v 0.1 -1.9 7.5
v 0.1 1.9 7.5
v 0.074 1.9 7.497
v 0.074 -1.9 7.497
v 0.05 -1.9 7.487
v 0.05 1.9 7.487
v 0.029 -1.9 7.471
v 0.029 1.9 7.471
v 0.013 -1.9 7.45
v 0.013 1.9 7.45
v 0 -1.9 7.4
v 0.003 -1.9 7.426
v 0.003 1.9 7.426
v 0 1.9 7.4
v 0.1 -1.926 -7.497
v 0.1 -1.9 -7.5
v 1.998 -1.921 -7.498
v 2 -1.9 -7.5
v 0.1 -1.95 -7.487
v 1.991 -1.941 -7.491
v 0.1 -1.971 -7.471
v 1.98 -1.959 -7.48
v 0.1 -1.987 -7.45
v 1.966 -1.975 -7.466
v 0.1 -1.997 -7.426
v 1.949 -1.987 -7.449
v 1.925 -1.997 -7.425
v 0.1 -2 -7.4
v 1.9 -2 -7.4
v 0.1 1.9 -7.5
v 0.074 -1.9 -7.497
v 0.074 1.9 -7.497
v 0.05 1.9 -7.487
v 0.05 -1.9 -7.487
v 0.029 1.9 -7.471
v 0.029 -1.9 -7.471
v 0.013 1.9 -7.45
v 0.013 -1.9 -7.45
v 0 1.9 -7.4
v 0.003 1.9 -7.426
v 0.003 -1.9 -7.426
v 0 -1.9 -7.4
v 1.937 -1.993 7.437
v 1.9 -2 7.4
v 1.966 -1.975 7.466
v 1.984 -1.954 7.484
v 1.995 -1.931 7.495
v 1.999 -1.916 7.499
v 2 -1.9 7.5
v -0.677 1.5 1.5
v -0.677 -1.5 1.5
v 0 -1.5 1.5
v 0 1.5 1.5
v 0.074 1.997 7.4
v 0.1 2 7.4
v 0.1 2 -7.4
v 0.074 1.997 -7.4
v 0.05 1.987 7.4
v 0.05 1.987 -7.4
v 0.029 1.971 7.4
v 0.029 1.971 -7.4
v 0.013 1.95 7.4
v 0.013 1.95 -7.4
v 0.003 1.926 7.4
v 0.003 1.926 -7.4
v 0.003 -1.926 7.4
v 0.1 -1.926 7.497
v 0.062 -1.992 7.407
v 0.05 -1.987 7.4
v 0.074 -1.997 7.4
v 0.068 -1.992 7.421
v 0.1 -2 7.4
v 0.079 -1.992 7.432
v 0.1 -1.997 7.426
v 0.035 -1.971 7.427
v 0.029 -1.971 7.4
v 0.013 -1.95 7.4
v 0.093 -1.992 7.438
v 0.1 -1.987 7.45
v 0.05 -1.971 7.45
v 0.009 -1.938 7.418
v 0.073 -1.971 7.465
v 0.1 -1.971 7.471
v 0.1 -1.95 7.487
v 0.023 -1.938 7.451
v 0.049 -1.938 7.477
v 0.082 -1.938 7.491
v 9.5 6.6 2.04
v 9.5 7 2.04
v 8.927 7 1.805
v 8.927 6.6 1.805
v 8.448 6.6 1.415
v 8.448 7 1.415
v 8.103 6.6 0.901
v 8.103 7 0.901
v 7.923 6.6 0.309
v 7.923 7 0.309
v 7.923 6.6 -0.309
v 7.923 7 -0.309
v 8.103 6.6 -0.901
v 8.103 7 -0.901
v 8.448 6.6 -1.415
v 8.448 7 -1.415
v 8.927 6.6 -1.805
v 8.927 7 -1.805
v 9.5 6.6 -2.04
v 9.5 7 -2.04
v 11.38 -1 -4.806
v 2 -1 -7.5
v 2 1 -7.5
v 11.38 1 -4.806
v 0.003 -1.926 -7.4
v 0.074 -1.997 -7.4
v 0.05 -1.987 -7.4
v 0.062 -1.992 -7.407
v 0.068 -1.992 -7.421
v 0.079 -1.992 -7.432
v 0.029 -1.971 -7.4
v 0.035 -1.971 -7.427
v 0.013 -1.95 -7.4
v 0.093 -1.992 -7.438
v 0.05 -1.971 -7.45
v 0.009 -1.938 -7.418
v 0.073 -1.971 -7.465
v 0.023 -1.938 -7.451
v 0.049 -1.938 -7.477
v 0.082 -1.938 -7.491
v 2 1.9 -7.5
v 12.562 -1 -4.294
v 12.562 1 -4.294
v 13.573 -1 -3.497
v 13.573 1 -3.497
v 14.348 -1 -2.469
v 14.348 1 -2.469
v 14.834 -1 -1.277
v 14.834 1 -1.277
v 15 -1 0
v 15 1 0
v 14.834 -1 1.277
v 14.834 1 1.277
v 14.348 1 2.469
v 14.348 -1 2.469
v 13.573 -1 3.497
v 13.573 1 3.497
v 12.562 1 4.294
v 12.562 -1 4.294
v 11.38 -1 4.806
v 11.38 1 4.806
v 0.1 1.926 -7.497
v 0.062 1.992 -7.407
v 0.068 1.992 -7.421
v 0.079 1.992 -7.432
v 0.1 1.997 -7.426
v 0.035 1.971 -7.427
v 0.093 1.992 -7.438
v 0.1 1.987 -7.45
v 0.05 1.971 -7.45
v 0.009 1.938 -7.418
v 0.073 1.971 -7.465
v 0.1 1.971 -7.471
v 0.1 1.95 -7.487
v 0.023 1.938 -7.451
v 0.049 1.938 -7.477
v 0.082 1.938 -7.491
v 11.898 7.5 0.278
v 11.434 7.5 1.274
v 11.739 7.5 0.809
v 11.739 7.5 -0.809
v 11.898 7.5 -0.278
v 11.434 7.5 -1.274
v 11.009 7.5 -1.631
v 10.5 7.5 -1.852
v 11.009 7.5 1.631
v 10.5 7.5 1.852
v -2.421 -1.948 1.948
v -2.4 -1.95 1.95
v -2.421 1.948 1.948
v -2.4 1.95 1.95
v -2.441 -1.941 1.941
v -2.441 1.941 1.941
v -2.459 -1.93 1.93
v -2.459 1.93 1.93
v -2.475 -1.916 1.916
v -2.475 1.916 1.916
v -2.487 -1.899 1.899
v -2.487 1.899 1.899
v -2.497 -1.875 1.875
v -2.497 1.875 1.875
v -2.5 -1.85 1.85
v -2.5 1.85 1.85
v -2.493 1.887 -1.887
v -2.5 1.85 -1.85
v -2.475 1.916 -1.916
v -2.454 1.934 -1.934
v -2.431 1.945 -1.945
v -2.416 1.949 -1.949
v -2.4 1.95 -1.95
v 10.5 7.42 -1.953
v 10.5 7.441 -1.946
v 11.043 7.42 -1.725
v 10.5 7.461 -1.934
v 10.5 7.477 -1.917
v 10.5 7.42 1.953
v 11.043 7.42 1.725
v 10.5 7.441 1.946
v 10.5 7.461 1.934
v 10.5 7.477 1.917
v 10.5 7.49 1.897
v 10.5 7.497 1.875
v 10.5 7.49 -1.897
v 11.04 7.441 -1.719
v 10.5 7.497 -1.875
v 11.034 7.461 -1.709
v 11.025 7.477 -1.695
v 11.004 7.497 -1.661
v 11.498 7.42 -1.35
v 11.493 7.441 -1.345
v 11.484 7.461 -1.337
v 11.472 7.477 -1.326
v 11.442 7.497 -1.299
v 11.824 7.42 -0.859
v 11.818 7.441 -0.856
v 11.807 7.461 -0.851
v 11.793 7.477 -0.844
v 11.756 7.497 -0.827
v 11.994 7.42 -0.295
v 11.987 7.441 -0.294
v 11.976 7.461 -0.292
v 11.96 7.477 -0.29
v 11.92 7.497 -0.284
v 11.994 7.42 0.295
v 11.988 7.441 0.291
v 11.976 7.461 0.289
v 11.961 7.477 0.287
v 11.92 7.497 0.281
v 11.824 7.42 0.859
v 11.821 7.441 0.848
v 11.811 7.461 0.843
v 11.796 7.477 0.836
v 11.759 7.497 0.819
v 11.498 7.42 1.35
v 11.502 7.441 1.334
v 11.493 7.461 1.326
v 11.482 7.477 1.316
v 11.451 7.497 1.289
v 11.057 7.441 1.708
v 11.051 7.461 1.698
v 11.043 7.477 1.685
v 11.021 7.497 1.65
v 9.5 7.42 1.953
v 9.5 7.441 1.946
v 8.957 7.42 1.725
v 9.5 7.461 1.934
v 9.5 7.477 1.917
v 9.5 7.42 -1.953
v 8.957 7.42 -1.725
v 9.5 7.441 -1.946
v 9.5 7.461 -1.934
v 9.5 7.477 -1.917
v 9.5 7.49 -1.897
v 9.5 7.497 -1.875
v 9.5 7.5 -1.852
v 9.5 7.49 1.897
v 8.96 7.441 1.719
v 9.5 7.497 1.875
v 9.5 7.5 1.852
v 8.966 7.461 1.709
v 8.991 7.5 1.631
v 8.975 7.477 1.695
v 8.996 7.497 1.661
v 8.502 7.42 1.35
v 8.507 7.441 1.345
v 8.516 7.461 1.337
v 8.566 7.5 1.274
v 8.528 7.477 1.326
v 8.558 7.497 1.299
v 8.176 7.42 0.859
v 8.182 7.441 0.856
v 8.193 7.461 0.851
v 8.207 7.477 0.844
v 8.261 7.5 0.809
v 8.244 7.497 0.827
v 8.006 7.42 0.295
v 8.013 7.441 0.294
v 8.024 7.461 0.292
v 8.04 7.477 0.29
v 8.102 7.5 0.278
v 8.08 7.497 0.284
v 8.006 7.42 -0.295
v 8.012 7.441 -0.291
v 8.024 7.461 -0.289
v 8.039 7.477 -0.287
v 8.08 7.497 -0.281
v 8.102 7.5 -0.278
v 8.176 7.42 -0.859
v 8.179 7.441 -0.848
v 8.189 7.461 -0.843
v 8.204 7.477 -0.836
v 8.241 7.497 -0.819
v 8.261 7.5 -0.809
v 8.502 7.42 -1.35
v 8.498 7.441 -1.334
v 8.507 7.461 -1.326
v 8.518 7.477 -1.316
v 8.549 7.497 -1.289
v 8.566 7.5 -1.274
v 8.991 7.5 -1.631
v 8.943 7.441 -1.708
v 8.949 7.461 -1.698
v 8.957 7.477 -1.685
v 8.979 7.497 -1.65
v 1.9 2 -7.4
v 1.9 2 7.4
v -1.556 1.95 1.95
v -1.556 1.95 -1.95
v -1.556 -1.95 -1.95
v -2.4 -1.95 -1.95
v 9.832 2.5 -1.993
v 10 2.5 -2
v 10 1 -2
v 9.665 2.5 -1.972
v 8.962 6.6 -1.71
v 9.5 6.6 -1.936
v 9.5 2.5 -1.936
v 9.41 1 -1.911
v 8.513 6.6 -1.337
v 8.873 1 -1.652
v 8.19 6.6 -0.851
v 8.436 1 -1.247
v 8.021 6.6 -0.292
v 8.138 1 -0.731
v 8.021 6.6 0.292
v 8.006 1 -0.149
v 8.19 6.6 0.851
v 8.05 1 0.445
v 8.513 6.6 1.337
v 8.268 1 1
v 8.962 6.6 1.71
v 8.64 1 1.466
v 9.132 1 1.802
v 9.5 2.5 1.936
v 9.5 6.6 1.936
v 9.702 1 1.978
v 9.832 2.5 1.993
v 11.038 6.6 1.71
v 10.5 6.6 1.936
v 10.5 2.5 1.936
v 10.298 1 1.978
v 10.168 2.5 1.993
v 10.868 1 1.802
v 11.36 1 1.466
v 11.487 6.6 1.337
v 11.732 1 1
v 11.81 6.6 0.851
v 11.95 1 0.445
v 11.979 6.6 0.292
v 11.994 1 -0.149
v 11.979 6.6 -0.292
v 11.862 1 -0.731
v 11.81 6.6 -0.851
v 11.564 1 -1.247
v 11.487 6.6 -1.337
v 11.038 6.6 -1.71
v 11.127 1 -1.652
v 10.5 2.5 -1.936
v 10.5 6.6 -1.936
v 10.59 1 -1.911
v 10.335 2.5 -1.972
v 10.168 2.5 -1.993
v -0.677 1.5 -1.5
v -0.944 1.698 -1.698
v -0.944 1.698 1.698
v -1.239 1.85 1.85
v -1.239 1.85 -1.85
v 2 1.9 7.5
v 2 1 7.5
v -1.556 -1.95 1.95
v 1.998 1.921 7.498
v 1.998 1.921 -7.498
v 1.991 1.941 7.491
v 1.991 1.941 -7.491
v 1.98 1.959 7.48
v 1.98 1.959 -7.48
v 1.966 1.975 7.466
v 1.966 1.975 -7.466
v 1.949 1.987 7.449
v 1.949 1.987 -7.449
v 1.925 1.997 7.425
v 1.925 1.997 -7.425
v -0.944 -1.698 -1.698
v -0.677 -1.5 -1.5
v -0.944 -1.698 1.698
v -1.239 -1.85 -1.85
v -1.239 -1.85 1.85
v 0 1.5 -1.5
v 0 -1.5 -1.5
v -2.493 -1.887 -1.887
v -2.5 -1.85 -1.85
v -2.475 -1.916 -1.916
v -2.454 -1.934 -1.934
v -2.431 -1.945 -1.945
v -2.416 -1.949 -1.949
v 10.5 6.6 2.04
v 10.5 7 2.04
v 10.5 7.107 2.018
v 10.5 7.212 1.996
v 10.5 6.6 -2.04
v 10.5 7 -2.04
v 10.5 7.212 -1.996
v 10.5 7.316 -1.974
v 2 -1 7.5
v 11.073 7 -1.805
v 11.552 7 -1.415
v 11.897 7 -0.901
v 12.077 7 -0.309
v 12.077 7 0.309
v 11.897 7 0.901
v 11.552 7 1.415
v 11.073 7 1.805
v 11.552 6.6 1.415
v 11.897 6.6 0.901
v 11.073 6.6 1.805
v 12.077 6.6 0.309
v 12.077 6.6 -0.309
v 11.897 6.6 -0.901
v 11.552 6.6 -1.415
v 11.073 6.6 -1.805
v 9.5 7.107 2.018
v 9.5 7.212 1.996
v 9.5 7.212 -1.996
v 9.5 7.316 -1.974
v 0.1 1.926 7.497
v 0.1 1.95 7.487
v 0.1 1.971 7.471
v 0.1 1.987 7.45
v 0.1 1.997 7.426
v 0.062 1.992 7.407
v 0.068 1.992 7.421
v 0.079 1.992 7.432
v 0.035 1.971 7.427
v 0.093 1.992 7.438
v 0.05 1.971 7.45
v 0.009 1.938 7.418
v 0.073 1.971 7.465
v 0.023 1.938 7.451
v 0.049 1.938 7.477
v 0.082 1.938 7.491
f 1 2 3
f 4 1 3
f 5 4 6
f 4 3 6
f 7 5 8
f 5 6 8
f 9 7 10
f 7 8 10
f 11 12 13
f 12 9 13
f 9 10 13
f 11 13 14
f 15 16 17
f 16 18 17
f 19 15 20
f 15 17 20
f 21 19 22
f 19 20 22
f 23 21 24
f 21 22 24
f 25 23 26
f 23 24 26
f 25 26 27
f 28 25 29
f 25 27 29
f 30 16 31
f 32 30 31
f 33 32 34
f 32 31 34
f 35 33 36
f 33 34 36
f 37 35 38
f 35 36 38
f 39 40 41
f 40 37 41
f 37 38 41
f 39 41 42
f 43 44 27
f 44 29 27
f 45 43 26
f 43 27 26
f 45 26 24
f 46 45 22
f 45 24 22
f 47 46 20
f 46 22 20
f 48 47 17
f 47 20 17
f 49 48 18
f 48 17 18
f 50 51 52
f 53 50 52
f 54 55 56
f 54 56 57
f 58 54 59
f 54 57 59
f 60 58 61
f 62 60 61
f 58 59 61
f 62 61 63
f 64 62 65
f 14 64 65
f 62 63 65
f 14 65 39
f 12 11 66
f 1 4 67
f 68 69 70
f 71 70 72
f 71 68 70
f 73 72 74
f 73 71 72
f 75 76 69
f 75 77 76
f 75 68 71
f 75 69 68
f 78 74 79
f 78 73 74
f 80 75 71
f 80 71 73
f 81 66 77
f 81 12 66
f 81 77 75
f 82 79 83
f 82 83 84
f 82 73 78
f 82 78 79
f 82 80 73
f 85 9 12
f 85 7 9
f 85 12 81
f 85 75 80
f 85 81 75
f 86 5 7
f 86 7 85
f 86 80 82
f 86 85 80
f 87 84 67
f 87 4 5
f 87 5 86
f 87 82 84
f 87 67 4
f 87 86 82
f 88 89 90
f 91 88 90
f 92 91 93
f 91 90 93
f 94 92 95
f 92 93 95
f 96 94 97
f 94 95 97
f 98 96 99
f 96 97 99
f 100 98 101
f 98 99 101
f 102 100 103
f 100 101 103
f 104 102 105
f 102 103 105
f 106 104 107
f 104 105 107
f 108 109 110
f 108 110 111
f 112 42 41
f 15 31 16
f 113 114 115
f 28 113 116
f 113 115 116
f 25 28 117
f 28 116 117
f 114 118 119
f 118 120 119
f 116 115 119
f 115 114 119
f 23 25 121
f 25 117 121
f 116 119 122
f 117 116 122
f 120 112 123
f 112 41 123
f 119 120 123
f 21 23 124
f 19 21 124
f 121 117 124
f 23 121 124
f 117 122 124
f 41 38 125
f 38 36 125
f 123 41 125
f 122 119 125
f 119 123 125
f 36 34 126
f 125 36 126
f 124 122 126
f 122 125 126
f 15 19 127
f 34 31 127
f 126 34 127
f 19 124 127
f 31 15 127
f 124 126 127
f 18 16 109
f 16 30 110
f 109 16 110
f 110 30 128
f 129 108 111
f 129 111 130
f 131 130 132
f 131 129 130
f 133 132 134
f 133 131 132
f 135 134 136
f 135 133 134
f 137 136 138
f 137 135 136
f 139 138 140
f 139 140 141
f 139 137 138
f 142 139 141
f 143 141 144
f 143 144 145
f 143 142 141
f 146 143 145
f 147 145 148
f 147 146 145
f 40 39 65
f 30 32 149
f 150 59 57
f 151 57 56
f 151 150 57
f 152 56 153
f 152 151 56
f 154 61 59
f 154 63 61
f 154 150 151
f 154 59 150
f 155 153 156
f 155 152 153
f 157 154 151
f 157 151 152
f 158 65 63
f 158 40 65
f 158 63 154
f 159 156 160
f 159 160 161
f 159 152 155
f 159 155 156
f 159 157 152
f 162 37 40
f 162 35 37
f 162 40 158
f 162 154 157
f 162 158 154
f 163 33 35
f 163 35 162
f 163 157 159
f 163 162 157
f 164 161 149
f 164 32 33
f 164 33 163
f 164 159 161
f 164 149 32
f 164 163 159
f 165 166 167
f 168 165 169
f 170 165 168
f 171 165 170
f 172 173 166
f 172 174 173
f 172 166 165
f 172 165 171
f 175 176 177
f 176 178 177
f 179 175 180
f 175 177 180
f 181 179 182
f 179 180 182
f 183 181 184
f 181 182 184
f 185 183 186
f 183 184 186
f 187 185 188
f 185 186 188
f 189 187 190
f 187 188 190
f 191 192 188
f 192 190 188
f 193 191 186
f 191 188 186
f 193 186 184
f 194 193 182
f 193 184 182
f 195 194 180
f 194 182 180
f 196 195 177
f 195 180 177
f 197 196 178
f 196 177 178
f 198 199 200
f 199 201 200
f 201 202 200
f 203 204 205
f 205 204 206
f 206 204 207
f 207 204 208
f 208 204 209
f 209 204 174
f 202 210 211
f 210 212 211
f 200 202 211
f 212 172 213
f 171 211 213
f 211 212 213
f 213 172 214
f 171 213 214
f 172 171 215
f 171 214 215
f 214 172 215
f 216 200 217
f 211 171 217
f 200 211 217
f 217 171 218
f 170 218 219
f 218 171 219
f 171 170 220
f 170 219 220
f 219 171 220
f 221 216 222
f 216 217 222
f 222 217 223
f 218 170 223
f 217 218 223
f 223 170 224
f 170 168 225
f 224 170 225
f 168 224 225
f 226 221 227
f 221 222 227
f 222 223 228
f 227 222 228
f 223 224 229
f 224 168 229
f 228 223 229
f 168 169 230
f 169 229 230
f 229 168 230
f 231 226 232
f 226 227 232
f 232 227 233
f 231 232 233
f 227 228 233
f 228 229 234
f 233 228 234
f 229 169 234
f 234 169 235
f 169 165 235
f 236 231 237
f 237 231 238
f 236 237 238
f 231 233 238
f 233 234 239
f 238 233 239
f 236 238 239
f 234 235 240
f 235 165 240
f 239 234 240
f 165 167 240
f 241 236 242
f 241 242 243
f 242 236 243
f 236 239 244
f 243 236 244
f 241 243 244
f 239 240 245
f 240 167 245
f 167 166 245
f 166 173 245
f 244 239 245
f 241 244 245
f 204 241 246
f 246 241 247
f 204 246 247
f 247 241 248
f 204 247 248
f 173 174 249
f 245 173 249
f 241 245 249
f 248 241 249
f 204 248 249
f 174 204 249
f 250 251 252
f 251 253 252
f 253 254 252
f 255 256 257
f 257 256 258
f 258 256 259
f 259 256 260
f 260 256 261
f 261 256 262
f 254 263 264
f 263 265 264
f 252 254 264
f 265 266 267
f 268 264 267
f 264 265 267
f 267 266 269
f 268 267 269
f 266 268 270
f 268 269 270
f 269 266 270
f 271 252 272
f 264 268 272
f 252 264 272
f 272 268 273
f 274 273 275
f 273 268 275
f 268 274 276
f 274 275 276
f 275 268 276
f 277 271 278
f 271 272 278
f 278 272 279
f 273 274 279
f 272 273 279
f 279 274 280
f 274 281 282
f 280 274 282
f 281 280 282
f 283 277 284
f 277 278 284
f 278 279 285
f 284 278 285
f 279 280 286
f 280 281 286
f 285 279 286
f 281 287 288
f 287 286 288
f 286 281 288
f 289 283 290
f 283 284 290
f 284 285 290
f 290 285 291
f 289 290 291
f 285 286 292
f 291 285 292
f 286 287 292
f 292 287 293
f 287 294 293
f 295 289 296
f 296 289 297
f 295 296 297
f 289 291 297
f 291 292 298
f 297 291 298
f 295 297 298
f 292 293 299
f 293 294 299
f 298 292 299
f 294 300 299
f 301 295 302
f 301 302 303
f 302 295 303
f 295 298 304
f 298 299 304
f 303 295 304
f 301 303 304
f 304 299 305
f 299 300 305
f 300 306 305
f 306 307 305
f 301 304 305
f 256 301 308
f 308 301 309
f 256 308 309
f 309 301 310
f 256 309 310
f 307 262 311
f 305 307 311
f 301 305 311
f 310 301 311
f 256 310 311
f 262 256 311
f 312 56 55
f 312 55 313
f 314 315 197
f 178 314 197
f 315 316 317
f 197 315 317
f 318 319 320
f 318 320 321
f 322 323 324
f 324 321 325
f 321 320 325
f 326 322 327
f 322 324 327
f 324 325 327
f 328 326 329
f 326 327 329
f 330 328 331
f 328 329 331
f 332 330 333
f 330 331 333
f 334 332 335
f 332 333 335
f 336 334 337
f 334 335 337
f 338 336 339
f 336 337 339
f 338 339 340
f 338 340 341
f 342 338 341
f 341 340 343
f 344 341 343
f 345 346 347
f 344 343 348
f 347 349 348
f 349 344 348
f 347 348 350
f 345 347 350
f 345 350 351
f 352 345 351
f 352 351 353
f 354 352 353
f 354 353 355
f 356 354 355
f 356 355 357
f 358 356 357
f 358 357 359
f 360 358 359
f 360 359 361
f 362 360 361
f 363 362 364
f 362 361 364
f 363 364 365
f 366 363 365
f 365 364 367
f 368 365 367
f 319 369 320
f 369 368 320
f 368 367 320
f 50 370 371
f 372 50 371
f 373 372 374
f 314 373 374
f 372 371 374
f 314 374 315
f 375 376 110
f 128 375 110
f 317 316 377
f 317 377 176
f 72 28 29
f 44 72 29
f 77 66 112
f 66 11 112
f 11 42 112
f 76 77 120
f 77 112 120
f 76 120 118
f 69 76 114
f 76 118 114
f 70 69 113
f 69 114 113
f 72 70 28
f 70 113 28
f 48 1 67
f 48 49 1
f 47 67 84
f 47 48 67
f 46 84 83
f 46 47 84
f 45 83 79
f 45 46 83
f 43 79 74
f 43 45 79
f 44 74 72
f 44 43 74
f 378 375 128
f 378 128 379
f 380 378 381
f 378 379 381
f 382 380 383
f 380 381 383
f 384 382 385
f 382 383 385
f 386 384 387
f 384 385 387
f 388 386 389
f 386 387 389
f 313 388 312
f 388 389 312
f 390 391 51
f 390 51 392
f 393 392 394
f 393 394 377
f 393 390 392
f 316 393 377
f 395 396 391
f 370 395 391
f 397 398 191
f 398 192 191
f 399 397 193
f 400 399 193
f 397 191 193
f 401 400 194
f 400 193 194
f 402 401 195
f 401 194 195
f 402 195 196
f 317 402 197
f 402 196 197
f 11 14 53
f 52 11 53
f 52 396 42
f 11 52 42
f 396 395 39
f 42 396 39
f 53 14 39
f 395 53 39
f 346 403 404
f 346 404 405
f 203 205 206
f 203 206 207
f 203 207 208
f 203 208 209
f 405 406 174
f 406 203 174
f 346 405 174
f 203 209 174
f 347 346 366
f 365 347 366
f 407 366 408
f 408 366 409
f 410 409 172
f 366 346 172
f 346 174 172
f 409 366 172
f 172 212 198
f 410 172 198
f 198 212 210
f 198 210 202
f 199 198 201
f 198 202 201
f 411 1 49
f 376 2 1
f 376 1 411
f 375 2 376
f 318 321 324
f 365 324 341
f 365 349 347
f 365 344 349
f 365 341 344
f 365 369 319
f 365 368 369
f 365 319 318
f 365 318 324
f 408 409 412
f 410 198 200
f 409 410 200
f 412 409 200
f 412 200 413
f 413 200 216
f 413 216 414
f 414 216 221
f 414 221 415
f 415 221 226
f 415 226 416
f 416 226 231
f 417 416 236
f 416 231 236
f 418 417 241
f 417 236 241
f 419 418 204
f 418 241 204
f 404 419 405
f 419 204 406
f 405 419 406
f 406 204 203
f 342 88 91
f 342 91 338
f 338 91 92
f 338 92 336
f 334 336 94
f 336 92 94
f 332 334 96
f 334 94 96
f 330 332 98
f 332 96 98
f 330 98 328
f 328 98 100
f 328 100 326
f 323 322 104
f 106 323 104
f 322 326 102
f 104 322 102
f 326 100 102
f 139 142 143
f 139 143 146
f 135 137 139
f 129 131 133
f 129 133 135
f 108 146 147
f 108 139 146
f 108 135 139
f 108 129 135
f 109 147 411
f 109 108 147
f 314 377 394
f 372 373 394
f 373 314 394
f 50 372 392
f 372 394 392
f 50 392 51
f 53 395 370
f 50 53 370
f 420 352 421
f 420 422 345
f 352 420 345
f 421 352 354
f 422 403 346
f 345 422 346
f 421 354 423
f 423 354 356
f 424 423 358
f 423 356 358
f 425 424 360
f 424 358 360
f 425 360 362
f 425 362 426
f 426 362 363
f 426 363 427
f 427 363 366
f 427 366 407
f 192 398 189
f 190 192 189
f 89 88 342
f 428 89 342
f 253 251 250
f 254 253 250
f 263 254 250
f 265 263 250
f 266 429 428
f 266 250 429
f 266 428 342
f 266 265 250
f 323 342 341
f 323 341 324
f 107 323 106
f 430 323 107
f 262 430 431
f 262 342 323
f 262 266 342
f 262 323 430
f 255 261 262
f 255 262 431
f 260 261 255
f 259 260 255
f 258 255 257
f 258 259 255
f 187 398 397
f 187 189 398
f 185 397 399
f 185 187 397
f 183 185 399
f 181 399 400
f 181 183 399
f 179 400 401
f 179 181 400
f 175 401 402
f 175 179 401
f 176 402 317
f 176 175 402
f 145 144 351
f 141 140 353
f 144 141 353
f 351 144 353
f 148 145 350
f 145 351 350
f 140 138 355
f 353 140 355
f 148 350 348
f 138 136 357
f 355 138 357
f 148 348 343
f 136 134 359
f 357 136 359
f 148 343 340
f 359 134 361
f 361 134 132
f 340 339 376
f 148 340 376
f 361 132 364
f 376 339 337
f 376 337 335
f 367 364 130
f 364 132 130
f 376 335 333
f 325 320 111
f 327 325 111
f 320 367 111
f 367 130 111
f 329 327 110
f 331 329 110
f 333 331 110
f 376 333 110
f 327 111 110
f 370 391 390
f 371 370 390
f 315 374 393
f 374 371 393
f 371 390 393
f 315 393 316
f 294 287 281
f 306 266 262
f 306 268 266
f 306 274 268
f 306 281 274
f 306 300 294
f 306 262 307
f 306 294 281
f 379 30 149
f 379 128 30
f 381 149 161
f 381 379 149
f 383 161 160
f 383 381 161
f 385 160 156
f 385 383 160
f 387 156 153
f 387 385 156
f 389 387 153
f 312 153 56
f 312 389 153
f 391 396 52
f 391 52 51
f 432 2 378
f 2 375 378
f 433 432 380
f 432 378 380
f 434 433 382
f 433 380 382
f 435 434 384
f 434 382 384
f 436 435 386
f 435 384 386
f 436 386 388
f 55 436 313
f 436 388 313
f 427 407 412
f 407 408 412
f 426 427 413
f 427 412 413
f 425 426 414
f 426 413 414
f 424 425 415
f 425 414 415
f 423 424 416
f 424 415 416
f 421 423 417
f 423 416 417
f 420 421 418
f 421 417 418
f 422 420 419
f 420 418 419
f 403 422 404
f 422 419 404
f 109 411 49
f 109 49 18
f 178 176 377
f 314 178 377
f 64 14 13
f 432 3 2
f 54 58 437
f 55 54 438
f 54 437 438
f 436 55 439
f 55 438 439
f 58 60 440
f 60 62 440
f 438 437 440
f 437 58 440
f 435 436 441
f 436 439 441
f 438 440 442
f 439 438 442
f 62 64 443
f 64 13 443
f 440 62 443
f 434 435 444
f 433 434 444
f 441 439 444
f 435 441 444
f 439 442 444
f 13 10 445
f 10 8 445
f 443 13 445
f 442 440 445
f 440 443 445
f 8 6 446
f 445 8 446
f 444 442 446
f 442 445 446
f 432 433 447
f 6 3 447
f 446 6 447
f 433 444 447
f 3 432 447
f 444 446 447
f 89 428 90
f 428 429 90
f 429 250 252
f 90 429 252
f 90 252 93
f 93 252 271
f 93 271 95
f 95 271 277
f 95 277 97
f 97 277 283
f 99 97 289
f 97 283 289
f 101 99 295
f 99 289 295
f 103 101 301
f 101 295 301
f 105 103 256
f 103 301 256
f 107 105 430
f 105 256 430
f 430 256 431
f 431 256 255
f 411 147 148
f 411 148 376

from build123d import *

# Parameters (mm, degrees)
EXTRUDE_1_DEPTH          = 1
EXTRUDE_1_DEPTH_BACK     = 1
SKETCH_3_W               = 2
SKETCH_3_H               = 15
EXTRUDE_2_DEPTH          = 1
SKETCH_4_R               = 2
EXTRUDE_3_DEPTH          = 6.5
SKETCH_6_W               = 1
SKETCH_6_H               = 6
CUT_EXTRUDE_1_DEPTH      = 5
EXTRUDE_4_DEPTH          = 3
EXTRUDE_4_DEPTH_BACK     = 3
CUT_EXTRUDE_2_DEPTH      = 5
CUT_EXTRUDE_2_DEPTH_BACK = 5
FILLET_2_R               = 0.1
FILLET_4_R               = 0.1


with BuildPart() as part:
    # 草图1 → 凸台-拉伸1 (new, two sides: drawn at the far end of the back side and taken through both)
    with BuildSketch(Plane(origin=(0, 0, 0), x_dir=(1, 0, 0), z_dir=(0, 1, 0)).offset(-EXTRUDE_1_DEPTH_BACK)):
        with BuildLine():
            Line((0, -7.5), (0, 7.5))
            Line((0, 7.5), (2, 7.5))
            Line((2, 7.5), (11.380335961, 4.805691692))
            ThreePointArc((11.380335961, 4.805691692), (15, 0), (11.380335961, -4.805691692))
            Line((11.380335961, -4.805691692), (2, -7.5))
            Line((2, -7.5), (0, -7.5))
        make_face()
    extrude(amount=EXTRUDE_1_DEPTH + EXTRUDE_1_DEPTH_BACK)

    # 草图3 → 凸台-拉伸2 (add)
    with BuildSketch(Plane(origin=(0, 1, 0), x_dir=(1, 0, 0), z_dir=(0, 1, 0))):
        with Locations((1, 0)):
            Rectangle(SKETCH_3_W, SKETCH_3_H)
    extrude_2 = extrude(amount=EXTRUDE_2_DEPTH)

    # 镜向1: 凸台-拉伸2 across plane
    add(extrude_2.mirror(Plane.ZX))

    # 草图4 → 凸台-拉伸3 (add)
    with BuildSketch(Plane(origin=(0, 1, 0), x_dir=(1, 0, 0), z_dir=(0, 1, 0))):
        with Locations((10, 0)):
            Circle(SKETCH_4_R)
    extrude(amount=EXTRUDE_3_DEPTH)

    # 草图5 → 旋转1 (revolve)
    with BuildSketch(Plane.XY):
        Polygon((8, 7.5), (8, 6.6), (7.9, 6.6), (7.9, 7), align=None)
    revolve(axis=Axis((10, 7.5, 0), (0, -1, 0)))

    # 草图6 → 切除-拉伸1 (cut)
    with BuildSketch(Plane(origin=(0, 7.5, 0), x_dir=(1, 0, 0), z_dir=(0, 1, 0))):
        with Locations((10, 0)):
            Rectangle(SKETCH_6_W, SKETCH_6_H)
    extrude(amount=-CUT_EXTRUDE_1_DEPTH, mode=Mode.SUBTRACT)

    # 草图7 → 凸台-拉伸4 (add, two sides: drawn at the far end of the back side and taken through both)
    with BuildSketch(Plane(origin=(0, 0, 0), x_dir=(1, 0, 0), z_dir=(0, 1, 0)).offset(-EXTRUDE_4_DEPTH_BACK)):
        with BuildLine():
            Line((0, -1.5), (0, 1.5))
            Line((0, 1.5), (-0.677124344, 1.5))
            ThreePointArc((-0.677124344, 1.5), (-1.088161527, 1.780042303), (-1.555590279, 1.95))
            Line((-1.555590279, 1.95), (-2.5, 1.95))
            Line((-2.5, 1.95), (-2.5, -1.95))
            Line((-2.5, -1.95), (-1.555590279, -1.95))
            ThreePointArc((-1.555590279, -1.95), (-1.088161527, -1.780042303), (-0.677124344, -1.5))
            Line((-0.677124344, -1.5), (0, -1.5))
        make_face()
    extrude(amount=EXTRUDE_4_DEPTH + EXTRUDE_4_DEPTH_BACK)

    # 草图8 → 切除-拉伸2 (cut, two sides: drawn at the far end of the back side and taken through both)
    with BuildSketch(Plane.XY.offset(-CUT_EXTRUDE_2_DEPTH_BACK)):
        with BuildLine():
            Line((0, -3), (0, -1.5))
            Line((0, -1.5), (-0.677124344, -1.5))
            ThreePointArc((-0.677124344, -1.5), (-1.088161527, -1.780042303), (-1.555590279, -1.95))
            Line((-1.555590279, -1.95), (-2.5, -1.95))
            Line((-2.5, -1.95), (-2.5, -3))
            Line((-2.5, -3), (0, -3))
        make_face()
        with BuildLine():
            Line((0, 1.5), (-0.677124344, 1.5))
            ThreePointArc((-0.677124344, 1.5), (-1.088161527, 1.780042303), (-1.555590279, 1.95))
            Line((-1.555590279, 1.95), (-2.5, 1.95))
            Line((-2.5, 1.95), (-2.5, 3))
            Line((-2.5, 3), (0, 3))
            Line((0, 3), (0, 1.5))
        make_face()
    extrude(amount=CUT_EXTRUDE_2_DEPTH + CUT_EXTRUDE_2_DEPTH_BACK, mode=Mode.SUBTRACT)

    # 圆角2
    fillet_2_edges = [part.edges().sort_by_distance(p)[0] for p in [
        (-2.5, 0, 1.95),
        (-2.5, -1.95, 0),
        (-2.5, 0, -1.95),
        (-2.5, 1.95, 0),
        (8, 7.5, 0),
        (12, 7.5, 0),
    ]]
    fillet(fillet_2_edges, radius=FILLET_2_R)

    # 圆角4
    fillet_4_edges = [part.edges().sort_by_distance(p)[0] for p in [
        (1, -2, -7.5),
        (2, -2, 0),
        (1, -2, 7.5),
        (2, 2, 0),
        (1, 2, 7.5),
        (1, 2, -7.5),
        (0, 0, -7.5),
        (0, 0, 7.5),
        (0, -2, 0),
        (0, 2, 0),
    ]]
    fillet(fillet_4_edges, radius=FILLET_4_R)


solid = part.part
